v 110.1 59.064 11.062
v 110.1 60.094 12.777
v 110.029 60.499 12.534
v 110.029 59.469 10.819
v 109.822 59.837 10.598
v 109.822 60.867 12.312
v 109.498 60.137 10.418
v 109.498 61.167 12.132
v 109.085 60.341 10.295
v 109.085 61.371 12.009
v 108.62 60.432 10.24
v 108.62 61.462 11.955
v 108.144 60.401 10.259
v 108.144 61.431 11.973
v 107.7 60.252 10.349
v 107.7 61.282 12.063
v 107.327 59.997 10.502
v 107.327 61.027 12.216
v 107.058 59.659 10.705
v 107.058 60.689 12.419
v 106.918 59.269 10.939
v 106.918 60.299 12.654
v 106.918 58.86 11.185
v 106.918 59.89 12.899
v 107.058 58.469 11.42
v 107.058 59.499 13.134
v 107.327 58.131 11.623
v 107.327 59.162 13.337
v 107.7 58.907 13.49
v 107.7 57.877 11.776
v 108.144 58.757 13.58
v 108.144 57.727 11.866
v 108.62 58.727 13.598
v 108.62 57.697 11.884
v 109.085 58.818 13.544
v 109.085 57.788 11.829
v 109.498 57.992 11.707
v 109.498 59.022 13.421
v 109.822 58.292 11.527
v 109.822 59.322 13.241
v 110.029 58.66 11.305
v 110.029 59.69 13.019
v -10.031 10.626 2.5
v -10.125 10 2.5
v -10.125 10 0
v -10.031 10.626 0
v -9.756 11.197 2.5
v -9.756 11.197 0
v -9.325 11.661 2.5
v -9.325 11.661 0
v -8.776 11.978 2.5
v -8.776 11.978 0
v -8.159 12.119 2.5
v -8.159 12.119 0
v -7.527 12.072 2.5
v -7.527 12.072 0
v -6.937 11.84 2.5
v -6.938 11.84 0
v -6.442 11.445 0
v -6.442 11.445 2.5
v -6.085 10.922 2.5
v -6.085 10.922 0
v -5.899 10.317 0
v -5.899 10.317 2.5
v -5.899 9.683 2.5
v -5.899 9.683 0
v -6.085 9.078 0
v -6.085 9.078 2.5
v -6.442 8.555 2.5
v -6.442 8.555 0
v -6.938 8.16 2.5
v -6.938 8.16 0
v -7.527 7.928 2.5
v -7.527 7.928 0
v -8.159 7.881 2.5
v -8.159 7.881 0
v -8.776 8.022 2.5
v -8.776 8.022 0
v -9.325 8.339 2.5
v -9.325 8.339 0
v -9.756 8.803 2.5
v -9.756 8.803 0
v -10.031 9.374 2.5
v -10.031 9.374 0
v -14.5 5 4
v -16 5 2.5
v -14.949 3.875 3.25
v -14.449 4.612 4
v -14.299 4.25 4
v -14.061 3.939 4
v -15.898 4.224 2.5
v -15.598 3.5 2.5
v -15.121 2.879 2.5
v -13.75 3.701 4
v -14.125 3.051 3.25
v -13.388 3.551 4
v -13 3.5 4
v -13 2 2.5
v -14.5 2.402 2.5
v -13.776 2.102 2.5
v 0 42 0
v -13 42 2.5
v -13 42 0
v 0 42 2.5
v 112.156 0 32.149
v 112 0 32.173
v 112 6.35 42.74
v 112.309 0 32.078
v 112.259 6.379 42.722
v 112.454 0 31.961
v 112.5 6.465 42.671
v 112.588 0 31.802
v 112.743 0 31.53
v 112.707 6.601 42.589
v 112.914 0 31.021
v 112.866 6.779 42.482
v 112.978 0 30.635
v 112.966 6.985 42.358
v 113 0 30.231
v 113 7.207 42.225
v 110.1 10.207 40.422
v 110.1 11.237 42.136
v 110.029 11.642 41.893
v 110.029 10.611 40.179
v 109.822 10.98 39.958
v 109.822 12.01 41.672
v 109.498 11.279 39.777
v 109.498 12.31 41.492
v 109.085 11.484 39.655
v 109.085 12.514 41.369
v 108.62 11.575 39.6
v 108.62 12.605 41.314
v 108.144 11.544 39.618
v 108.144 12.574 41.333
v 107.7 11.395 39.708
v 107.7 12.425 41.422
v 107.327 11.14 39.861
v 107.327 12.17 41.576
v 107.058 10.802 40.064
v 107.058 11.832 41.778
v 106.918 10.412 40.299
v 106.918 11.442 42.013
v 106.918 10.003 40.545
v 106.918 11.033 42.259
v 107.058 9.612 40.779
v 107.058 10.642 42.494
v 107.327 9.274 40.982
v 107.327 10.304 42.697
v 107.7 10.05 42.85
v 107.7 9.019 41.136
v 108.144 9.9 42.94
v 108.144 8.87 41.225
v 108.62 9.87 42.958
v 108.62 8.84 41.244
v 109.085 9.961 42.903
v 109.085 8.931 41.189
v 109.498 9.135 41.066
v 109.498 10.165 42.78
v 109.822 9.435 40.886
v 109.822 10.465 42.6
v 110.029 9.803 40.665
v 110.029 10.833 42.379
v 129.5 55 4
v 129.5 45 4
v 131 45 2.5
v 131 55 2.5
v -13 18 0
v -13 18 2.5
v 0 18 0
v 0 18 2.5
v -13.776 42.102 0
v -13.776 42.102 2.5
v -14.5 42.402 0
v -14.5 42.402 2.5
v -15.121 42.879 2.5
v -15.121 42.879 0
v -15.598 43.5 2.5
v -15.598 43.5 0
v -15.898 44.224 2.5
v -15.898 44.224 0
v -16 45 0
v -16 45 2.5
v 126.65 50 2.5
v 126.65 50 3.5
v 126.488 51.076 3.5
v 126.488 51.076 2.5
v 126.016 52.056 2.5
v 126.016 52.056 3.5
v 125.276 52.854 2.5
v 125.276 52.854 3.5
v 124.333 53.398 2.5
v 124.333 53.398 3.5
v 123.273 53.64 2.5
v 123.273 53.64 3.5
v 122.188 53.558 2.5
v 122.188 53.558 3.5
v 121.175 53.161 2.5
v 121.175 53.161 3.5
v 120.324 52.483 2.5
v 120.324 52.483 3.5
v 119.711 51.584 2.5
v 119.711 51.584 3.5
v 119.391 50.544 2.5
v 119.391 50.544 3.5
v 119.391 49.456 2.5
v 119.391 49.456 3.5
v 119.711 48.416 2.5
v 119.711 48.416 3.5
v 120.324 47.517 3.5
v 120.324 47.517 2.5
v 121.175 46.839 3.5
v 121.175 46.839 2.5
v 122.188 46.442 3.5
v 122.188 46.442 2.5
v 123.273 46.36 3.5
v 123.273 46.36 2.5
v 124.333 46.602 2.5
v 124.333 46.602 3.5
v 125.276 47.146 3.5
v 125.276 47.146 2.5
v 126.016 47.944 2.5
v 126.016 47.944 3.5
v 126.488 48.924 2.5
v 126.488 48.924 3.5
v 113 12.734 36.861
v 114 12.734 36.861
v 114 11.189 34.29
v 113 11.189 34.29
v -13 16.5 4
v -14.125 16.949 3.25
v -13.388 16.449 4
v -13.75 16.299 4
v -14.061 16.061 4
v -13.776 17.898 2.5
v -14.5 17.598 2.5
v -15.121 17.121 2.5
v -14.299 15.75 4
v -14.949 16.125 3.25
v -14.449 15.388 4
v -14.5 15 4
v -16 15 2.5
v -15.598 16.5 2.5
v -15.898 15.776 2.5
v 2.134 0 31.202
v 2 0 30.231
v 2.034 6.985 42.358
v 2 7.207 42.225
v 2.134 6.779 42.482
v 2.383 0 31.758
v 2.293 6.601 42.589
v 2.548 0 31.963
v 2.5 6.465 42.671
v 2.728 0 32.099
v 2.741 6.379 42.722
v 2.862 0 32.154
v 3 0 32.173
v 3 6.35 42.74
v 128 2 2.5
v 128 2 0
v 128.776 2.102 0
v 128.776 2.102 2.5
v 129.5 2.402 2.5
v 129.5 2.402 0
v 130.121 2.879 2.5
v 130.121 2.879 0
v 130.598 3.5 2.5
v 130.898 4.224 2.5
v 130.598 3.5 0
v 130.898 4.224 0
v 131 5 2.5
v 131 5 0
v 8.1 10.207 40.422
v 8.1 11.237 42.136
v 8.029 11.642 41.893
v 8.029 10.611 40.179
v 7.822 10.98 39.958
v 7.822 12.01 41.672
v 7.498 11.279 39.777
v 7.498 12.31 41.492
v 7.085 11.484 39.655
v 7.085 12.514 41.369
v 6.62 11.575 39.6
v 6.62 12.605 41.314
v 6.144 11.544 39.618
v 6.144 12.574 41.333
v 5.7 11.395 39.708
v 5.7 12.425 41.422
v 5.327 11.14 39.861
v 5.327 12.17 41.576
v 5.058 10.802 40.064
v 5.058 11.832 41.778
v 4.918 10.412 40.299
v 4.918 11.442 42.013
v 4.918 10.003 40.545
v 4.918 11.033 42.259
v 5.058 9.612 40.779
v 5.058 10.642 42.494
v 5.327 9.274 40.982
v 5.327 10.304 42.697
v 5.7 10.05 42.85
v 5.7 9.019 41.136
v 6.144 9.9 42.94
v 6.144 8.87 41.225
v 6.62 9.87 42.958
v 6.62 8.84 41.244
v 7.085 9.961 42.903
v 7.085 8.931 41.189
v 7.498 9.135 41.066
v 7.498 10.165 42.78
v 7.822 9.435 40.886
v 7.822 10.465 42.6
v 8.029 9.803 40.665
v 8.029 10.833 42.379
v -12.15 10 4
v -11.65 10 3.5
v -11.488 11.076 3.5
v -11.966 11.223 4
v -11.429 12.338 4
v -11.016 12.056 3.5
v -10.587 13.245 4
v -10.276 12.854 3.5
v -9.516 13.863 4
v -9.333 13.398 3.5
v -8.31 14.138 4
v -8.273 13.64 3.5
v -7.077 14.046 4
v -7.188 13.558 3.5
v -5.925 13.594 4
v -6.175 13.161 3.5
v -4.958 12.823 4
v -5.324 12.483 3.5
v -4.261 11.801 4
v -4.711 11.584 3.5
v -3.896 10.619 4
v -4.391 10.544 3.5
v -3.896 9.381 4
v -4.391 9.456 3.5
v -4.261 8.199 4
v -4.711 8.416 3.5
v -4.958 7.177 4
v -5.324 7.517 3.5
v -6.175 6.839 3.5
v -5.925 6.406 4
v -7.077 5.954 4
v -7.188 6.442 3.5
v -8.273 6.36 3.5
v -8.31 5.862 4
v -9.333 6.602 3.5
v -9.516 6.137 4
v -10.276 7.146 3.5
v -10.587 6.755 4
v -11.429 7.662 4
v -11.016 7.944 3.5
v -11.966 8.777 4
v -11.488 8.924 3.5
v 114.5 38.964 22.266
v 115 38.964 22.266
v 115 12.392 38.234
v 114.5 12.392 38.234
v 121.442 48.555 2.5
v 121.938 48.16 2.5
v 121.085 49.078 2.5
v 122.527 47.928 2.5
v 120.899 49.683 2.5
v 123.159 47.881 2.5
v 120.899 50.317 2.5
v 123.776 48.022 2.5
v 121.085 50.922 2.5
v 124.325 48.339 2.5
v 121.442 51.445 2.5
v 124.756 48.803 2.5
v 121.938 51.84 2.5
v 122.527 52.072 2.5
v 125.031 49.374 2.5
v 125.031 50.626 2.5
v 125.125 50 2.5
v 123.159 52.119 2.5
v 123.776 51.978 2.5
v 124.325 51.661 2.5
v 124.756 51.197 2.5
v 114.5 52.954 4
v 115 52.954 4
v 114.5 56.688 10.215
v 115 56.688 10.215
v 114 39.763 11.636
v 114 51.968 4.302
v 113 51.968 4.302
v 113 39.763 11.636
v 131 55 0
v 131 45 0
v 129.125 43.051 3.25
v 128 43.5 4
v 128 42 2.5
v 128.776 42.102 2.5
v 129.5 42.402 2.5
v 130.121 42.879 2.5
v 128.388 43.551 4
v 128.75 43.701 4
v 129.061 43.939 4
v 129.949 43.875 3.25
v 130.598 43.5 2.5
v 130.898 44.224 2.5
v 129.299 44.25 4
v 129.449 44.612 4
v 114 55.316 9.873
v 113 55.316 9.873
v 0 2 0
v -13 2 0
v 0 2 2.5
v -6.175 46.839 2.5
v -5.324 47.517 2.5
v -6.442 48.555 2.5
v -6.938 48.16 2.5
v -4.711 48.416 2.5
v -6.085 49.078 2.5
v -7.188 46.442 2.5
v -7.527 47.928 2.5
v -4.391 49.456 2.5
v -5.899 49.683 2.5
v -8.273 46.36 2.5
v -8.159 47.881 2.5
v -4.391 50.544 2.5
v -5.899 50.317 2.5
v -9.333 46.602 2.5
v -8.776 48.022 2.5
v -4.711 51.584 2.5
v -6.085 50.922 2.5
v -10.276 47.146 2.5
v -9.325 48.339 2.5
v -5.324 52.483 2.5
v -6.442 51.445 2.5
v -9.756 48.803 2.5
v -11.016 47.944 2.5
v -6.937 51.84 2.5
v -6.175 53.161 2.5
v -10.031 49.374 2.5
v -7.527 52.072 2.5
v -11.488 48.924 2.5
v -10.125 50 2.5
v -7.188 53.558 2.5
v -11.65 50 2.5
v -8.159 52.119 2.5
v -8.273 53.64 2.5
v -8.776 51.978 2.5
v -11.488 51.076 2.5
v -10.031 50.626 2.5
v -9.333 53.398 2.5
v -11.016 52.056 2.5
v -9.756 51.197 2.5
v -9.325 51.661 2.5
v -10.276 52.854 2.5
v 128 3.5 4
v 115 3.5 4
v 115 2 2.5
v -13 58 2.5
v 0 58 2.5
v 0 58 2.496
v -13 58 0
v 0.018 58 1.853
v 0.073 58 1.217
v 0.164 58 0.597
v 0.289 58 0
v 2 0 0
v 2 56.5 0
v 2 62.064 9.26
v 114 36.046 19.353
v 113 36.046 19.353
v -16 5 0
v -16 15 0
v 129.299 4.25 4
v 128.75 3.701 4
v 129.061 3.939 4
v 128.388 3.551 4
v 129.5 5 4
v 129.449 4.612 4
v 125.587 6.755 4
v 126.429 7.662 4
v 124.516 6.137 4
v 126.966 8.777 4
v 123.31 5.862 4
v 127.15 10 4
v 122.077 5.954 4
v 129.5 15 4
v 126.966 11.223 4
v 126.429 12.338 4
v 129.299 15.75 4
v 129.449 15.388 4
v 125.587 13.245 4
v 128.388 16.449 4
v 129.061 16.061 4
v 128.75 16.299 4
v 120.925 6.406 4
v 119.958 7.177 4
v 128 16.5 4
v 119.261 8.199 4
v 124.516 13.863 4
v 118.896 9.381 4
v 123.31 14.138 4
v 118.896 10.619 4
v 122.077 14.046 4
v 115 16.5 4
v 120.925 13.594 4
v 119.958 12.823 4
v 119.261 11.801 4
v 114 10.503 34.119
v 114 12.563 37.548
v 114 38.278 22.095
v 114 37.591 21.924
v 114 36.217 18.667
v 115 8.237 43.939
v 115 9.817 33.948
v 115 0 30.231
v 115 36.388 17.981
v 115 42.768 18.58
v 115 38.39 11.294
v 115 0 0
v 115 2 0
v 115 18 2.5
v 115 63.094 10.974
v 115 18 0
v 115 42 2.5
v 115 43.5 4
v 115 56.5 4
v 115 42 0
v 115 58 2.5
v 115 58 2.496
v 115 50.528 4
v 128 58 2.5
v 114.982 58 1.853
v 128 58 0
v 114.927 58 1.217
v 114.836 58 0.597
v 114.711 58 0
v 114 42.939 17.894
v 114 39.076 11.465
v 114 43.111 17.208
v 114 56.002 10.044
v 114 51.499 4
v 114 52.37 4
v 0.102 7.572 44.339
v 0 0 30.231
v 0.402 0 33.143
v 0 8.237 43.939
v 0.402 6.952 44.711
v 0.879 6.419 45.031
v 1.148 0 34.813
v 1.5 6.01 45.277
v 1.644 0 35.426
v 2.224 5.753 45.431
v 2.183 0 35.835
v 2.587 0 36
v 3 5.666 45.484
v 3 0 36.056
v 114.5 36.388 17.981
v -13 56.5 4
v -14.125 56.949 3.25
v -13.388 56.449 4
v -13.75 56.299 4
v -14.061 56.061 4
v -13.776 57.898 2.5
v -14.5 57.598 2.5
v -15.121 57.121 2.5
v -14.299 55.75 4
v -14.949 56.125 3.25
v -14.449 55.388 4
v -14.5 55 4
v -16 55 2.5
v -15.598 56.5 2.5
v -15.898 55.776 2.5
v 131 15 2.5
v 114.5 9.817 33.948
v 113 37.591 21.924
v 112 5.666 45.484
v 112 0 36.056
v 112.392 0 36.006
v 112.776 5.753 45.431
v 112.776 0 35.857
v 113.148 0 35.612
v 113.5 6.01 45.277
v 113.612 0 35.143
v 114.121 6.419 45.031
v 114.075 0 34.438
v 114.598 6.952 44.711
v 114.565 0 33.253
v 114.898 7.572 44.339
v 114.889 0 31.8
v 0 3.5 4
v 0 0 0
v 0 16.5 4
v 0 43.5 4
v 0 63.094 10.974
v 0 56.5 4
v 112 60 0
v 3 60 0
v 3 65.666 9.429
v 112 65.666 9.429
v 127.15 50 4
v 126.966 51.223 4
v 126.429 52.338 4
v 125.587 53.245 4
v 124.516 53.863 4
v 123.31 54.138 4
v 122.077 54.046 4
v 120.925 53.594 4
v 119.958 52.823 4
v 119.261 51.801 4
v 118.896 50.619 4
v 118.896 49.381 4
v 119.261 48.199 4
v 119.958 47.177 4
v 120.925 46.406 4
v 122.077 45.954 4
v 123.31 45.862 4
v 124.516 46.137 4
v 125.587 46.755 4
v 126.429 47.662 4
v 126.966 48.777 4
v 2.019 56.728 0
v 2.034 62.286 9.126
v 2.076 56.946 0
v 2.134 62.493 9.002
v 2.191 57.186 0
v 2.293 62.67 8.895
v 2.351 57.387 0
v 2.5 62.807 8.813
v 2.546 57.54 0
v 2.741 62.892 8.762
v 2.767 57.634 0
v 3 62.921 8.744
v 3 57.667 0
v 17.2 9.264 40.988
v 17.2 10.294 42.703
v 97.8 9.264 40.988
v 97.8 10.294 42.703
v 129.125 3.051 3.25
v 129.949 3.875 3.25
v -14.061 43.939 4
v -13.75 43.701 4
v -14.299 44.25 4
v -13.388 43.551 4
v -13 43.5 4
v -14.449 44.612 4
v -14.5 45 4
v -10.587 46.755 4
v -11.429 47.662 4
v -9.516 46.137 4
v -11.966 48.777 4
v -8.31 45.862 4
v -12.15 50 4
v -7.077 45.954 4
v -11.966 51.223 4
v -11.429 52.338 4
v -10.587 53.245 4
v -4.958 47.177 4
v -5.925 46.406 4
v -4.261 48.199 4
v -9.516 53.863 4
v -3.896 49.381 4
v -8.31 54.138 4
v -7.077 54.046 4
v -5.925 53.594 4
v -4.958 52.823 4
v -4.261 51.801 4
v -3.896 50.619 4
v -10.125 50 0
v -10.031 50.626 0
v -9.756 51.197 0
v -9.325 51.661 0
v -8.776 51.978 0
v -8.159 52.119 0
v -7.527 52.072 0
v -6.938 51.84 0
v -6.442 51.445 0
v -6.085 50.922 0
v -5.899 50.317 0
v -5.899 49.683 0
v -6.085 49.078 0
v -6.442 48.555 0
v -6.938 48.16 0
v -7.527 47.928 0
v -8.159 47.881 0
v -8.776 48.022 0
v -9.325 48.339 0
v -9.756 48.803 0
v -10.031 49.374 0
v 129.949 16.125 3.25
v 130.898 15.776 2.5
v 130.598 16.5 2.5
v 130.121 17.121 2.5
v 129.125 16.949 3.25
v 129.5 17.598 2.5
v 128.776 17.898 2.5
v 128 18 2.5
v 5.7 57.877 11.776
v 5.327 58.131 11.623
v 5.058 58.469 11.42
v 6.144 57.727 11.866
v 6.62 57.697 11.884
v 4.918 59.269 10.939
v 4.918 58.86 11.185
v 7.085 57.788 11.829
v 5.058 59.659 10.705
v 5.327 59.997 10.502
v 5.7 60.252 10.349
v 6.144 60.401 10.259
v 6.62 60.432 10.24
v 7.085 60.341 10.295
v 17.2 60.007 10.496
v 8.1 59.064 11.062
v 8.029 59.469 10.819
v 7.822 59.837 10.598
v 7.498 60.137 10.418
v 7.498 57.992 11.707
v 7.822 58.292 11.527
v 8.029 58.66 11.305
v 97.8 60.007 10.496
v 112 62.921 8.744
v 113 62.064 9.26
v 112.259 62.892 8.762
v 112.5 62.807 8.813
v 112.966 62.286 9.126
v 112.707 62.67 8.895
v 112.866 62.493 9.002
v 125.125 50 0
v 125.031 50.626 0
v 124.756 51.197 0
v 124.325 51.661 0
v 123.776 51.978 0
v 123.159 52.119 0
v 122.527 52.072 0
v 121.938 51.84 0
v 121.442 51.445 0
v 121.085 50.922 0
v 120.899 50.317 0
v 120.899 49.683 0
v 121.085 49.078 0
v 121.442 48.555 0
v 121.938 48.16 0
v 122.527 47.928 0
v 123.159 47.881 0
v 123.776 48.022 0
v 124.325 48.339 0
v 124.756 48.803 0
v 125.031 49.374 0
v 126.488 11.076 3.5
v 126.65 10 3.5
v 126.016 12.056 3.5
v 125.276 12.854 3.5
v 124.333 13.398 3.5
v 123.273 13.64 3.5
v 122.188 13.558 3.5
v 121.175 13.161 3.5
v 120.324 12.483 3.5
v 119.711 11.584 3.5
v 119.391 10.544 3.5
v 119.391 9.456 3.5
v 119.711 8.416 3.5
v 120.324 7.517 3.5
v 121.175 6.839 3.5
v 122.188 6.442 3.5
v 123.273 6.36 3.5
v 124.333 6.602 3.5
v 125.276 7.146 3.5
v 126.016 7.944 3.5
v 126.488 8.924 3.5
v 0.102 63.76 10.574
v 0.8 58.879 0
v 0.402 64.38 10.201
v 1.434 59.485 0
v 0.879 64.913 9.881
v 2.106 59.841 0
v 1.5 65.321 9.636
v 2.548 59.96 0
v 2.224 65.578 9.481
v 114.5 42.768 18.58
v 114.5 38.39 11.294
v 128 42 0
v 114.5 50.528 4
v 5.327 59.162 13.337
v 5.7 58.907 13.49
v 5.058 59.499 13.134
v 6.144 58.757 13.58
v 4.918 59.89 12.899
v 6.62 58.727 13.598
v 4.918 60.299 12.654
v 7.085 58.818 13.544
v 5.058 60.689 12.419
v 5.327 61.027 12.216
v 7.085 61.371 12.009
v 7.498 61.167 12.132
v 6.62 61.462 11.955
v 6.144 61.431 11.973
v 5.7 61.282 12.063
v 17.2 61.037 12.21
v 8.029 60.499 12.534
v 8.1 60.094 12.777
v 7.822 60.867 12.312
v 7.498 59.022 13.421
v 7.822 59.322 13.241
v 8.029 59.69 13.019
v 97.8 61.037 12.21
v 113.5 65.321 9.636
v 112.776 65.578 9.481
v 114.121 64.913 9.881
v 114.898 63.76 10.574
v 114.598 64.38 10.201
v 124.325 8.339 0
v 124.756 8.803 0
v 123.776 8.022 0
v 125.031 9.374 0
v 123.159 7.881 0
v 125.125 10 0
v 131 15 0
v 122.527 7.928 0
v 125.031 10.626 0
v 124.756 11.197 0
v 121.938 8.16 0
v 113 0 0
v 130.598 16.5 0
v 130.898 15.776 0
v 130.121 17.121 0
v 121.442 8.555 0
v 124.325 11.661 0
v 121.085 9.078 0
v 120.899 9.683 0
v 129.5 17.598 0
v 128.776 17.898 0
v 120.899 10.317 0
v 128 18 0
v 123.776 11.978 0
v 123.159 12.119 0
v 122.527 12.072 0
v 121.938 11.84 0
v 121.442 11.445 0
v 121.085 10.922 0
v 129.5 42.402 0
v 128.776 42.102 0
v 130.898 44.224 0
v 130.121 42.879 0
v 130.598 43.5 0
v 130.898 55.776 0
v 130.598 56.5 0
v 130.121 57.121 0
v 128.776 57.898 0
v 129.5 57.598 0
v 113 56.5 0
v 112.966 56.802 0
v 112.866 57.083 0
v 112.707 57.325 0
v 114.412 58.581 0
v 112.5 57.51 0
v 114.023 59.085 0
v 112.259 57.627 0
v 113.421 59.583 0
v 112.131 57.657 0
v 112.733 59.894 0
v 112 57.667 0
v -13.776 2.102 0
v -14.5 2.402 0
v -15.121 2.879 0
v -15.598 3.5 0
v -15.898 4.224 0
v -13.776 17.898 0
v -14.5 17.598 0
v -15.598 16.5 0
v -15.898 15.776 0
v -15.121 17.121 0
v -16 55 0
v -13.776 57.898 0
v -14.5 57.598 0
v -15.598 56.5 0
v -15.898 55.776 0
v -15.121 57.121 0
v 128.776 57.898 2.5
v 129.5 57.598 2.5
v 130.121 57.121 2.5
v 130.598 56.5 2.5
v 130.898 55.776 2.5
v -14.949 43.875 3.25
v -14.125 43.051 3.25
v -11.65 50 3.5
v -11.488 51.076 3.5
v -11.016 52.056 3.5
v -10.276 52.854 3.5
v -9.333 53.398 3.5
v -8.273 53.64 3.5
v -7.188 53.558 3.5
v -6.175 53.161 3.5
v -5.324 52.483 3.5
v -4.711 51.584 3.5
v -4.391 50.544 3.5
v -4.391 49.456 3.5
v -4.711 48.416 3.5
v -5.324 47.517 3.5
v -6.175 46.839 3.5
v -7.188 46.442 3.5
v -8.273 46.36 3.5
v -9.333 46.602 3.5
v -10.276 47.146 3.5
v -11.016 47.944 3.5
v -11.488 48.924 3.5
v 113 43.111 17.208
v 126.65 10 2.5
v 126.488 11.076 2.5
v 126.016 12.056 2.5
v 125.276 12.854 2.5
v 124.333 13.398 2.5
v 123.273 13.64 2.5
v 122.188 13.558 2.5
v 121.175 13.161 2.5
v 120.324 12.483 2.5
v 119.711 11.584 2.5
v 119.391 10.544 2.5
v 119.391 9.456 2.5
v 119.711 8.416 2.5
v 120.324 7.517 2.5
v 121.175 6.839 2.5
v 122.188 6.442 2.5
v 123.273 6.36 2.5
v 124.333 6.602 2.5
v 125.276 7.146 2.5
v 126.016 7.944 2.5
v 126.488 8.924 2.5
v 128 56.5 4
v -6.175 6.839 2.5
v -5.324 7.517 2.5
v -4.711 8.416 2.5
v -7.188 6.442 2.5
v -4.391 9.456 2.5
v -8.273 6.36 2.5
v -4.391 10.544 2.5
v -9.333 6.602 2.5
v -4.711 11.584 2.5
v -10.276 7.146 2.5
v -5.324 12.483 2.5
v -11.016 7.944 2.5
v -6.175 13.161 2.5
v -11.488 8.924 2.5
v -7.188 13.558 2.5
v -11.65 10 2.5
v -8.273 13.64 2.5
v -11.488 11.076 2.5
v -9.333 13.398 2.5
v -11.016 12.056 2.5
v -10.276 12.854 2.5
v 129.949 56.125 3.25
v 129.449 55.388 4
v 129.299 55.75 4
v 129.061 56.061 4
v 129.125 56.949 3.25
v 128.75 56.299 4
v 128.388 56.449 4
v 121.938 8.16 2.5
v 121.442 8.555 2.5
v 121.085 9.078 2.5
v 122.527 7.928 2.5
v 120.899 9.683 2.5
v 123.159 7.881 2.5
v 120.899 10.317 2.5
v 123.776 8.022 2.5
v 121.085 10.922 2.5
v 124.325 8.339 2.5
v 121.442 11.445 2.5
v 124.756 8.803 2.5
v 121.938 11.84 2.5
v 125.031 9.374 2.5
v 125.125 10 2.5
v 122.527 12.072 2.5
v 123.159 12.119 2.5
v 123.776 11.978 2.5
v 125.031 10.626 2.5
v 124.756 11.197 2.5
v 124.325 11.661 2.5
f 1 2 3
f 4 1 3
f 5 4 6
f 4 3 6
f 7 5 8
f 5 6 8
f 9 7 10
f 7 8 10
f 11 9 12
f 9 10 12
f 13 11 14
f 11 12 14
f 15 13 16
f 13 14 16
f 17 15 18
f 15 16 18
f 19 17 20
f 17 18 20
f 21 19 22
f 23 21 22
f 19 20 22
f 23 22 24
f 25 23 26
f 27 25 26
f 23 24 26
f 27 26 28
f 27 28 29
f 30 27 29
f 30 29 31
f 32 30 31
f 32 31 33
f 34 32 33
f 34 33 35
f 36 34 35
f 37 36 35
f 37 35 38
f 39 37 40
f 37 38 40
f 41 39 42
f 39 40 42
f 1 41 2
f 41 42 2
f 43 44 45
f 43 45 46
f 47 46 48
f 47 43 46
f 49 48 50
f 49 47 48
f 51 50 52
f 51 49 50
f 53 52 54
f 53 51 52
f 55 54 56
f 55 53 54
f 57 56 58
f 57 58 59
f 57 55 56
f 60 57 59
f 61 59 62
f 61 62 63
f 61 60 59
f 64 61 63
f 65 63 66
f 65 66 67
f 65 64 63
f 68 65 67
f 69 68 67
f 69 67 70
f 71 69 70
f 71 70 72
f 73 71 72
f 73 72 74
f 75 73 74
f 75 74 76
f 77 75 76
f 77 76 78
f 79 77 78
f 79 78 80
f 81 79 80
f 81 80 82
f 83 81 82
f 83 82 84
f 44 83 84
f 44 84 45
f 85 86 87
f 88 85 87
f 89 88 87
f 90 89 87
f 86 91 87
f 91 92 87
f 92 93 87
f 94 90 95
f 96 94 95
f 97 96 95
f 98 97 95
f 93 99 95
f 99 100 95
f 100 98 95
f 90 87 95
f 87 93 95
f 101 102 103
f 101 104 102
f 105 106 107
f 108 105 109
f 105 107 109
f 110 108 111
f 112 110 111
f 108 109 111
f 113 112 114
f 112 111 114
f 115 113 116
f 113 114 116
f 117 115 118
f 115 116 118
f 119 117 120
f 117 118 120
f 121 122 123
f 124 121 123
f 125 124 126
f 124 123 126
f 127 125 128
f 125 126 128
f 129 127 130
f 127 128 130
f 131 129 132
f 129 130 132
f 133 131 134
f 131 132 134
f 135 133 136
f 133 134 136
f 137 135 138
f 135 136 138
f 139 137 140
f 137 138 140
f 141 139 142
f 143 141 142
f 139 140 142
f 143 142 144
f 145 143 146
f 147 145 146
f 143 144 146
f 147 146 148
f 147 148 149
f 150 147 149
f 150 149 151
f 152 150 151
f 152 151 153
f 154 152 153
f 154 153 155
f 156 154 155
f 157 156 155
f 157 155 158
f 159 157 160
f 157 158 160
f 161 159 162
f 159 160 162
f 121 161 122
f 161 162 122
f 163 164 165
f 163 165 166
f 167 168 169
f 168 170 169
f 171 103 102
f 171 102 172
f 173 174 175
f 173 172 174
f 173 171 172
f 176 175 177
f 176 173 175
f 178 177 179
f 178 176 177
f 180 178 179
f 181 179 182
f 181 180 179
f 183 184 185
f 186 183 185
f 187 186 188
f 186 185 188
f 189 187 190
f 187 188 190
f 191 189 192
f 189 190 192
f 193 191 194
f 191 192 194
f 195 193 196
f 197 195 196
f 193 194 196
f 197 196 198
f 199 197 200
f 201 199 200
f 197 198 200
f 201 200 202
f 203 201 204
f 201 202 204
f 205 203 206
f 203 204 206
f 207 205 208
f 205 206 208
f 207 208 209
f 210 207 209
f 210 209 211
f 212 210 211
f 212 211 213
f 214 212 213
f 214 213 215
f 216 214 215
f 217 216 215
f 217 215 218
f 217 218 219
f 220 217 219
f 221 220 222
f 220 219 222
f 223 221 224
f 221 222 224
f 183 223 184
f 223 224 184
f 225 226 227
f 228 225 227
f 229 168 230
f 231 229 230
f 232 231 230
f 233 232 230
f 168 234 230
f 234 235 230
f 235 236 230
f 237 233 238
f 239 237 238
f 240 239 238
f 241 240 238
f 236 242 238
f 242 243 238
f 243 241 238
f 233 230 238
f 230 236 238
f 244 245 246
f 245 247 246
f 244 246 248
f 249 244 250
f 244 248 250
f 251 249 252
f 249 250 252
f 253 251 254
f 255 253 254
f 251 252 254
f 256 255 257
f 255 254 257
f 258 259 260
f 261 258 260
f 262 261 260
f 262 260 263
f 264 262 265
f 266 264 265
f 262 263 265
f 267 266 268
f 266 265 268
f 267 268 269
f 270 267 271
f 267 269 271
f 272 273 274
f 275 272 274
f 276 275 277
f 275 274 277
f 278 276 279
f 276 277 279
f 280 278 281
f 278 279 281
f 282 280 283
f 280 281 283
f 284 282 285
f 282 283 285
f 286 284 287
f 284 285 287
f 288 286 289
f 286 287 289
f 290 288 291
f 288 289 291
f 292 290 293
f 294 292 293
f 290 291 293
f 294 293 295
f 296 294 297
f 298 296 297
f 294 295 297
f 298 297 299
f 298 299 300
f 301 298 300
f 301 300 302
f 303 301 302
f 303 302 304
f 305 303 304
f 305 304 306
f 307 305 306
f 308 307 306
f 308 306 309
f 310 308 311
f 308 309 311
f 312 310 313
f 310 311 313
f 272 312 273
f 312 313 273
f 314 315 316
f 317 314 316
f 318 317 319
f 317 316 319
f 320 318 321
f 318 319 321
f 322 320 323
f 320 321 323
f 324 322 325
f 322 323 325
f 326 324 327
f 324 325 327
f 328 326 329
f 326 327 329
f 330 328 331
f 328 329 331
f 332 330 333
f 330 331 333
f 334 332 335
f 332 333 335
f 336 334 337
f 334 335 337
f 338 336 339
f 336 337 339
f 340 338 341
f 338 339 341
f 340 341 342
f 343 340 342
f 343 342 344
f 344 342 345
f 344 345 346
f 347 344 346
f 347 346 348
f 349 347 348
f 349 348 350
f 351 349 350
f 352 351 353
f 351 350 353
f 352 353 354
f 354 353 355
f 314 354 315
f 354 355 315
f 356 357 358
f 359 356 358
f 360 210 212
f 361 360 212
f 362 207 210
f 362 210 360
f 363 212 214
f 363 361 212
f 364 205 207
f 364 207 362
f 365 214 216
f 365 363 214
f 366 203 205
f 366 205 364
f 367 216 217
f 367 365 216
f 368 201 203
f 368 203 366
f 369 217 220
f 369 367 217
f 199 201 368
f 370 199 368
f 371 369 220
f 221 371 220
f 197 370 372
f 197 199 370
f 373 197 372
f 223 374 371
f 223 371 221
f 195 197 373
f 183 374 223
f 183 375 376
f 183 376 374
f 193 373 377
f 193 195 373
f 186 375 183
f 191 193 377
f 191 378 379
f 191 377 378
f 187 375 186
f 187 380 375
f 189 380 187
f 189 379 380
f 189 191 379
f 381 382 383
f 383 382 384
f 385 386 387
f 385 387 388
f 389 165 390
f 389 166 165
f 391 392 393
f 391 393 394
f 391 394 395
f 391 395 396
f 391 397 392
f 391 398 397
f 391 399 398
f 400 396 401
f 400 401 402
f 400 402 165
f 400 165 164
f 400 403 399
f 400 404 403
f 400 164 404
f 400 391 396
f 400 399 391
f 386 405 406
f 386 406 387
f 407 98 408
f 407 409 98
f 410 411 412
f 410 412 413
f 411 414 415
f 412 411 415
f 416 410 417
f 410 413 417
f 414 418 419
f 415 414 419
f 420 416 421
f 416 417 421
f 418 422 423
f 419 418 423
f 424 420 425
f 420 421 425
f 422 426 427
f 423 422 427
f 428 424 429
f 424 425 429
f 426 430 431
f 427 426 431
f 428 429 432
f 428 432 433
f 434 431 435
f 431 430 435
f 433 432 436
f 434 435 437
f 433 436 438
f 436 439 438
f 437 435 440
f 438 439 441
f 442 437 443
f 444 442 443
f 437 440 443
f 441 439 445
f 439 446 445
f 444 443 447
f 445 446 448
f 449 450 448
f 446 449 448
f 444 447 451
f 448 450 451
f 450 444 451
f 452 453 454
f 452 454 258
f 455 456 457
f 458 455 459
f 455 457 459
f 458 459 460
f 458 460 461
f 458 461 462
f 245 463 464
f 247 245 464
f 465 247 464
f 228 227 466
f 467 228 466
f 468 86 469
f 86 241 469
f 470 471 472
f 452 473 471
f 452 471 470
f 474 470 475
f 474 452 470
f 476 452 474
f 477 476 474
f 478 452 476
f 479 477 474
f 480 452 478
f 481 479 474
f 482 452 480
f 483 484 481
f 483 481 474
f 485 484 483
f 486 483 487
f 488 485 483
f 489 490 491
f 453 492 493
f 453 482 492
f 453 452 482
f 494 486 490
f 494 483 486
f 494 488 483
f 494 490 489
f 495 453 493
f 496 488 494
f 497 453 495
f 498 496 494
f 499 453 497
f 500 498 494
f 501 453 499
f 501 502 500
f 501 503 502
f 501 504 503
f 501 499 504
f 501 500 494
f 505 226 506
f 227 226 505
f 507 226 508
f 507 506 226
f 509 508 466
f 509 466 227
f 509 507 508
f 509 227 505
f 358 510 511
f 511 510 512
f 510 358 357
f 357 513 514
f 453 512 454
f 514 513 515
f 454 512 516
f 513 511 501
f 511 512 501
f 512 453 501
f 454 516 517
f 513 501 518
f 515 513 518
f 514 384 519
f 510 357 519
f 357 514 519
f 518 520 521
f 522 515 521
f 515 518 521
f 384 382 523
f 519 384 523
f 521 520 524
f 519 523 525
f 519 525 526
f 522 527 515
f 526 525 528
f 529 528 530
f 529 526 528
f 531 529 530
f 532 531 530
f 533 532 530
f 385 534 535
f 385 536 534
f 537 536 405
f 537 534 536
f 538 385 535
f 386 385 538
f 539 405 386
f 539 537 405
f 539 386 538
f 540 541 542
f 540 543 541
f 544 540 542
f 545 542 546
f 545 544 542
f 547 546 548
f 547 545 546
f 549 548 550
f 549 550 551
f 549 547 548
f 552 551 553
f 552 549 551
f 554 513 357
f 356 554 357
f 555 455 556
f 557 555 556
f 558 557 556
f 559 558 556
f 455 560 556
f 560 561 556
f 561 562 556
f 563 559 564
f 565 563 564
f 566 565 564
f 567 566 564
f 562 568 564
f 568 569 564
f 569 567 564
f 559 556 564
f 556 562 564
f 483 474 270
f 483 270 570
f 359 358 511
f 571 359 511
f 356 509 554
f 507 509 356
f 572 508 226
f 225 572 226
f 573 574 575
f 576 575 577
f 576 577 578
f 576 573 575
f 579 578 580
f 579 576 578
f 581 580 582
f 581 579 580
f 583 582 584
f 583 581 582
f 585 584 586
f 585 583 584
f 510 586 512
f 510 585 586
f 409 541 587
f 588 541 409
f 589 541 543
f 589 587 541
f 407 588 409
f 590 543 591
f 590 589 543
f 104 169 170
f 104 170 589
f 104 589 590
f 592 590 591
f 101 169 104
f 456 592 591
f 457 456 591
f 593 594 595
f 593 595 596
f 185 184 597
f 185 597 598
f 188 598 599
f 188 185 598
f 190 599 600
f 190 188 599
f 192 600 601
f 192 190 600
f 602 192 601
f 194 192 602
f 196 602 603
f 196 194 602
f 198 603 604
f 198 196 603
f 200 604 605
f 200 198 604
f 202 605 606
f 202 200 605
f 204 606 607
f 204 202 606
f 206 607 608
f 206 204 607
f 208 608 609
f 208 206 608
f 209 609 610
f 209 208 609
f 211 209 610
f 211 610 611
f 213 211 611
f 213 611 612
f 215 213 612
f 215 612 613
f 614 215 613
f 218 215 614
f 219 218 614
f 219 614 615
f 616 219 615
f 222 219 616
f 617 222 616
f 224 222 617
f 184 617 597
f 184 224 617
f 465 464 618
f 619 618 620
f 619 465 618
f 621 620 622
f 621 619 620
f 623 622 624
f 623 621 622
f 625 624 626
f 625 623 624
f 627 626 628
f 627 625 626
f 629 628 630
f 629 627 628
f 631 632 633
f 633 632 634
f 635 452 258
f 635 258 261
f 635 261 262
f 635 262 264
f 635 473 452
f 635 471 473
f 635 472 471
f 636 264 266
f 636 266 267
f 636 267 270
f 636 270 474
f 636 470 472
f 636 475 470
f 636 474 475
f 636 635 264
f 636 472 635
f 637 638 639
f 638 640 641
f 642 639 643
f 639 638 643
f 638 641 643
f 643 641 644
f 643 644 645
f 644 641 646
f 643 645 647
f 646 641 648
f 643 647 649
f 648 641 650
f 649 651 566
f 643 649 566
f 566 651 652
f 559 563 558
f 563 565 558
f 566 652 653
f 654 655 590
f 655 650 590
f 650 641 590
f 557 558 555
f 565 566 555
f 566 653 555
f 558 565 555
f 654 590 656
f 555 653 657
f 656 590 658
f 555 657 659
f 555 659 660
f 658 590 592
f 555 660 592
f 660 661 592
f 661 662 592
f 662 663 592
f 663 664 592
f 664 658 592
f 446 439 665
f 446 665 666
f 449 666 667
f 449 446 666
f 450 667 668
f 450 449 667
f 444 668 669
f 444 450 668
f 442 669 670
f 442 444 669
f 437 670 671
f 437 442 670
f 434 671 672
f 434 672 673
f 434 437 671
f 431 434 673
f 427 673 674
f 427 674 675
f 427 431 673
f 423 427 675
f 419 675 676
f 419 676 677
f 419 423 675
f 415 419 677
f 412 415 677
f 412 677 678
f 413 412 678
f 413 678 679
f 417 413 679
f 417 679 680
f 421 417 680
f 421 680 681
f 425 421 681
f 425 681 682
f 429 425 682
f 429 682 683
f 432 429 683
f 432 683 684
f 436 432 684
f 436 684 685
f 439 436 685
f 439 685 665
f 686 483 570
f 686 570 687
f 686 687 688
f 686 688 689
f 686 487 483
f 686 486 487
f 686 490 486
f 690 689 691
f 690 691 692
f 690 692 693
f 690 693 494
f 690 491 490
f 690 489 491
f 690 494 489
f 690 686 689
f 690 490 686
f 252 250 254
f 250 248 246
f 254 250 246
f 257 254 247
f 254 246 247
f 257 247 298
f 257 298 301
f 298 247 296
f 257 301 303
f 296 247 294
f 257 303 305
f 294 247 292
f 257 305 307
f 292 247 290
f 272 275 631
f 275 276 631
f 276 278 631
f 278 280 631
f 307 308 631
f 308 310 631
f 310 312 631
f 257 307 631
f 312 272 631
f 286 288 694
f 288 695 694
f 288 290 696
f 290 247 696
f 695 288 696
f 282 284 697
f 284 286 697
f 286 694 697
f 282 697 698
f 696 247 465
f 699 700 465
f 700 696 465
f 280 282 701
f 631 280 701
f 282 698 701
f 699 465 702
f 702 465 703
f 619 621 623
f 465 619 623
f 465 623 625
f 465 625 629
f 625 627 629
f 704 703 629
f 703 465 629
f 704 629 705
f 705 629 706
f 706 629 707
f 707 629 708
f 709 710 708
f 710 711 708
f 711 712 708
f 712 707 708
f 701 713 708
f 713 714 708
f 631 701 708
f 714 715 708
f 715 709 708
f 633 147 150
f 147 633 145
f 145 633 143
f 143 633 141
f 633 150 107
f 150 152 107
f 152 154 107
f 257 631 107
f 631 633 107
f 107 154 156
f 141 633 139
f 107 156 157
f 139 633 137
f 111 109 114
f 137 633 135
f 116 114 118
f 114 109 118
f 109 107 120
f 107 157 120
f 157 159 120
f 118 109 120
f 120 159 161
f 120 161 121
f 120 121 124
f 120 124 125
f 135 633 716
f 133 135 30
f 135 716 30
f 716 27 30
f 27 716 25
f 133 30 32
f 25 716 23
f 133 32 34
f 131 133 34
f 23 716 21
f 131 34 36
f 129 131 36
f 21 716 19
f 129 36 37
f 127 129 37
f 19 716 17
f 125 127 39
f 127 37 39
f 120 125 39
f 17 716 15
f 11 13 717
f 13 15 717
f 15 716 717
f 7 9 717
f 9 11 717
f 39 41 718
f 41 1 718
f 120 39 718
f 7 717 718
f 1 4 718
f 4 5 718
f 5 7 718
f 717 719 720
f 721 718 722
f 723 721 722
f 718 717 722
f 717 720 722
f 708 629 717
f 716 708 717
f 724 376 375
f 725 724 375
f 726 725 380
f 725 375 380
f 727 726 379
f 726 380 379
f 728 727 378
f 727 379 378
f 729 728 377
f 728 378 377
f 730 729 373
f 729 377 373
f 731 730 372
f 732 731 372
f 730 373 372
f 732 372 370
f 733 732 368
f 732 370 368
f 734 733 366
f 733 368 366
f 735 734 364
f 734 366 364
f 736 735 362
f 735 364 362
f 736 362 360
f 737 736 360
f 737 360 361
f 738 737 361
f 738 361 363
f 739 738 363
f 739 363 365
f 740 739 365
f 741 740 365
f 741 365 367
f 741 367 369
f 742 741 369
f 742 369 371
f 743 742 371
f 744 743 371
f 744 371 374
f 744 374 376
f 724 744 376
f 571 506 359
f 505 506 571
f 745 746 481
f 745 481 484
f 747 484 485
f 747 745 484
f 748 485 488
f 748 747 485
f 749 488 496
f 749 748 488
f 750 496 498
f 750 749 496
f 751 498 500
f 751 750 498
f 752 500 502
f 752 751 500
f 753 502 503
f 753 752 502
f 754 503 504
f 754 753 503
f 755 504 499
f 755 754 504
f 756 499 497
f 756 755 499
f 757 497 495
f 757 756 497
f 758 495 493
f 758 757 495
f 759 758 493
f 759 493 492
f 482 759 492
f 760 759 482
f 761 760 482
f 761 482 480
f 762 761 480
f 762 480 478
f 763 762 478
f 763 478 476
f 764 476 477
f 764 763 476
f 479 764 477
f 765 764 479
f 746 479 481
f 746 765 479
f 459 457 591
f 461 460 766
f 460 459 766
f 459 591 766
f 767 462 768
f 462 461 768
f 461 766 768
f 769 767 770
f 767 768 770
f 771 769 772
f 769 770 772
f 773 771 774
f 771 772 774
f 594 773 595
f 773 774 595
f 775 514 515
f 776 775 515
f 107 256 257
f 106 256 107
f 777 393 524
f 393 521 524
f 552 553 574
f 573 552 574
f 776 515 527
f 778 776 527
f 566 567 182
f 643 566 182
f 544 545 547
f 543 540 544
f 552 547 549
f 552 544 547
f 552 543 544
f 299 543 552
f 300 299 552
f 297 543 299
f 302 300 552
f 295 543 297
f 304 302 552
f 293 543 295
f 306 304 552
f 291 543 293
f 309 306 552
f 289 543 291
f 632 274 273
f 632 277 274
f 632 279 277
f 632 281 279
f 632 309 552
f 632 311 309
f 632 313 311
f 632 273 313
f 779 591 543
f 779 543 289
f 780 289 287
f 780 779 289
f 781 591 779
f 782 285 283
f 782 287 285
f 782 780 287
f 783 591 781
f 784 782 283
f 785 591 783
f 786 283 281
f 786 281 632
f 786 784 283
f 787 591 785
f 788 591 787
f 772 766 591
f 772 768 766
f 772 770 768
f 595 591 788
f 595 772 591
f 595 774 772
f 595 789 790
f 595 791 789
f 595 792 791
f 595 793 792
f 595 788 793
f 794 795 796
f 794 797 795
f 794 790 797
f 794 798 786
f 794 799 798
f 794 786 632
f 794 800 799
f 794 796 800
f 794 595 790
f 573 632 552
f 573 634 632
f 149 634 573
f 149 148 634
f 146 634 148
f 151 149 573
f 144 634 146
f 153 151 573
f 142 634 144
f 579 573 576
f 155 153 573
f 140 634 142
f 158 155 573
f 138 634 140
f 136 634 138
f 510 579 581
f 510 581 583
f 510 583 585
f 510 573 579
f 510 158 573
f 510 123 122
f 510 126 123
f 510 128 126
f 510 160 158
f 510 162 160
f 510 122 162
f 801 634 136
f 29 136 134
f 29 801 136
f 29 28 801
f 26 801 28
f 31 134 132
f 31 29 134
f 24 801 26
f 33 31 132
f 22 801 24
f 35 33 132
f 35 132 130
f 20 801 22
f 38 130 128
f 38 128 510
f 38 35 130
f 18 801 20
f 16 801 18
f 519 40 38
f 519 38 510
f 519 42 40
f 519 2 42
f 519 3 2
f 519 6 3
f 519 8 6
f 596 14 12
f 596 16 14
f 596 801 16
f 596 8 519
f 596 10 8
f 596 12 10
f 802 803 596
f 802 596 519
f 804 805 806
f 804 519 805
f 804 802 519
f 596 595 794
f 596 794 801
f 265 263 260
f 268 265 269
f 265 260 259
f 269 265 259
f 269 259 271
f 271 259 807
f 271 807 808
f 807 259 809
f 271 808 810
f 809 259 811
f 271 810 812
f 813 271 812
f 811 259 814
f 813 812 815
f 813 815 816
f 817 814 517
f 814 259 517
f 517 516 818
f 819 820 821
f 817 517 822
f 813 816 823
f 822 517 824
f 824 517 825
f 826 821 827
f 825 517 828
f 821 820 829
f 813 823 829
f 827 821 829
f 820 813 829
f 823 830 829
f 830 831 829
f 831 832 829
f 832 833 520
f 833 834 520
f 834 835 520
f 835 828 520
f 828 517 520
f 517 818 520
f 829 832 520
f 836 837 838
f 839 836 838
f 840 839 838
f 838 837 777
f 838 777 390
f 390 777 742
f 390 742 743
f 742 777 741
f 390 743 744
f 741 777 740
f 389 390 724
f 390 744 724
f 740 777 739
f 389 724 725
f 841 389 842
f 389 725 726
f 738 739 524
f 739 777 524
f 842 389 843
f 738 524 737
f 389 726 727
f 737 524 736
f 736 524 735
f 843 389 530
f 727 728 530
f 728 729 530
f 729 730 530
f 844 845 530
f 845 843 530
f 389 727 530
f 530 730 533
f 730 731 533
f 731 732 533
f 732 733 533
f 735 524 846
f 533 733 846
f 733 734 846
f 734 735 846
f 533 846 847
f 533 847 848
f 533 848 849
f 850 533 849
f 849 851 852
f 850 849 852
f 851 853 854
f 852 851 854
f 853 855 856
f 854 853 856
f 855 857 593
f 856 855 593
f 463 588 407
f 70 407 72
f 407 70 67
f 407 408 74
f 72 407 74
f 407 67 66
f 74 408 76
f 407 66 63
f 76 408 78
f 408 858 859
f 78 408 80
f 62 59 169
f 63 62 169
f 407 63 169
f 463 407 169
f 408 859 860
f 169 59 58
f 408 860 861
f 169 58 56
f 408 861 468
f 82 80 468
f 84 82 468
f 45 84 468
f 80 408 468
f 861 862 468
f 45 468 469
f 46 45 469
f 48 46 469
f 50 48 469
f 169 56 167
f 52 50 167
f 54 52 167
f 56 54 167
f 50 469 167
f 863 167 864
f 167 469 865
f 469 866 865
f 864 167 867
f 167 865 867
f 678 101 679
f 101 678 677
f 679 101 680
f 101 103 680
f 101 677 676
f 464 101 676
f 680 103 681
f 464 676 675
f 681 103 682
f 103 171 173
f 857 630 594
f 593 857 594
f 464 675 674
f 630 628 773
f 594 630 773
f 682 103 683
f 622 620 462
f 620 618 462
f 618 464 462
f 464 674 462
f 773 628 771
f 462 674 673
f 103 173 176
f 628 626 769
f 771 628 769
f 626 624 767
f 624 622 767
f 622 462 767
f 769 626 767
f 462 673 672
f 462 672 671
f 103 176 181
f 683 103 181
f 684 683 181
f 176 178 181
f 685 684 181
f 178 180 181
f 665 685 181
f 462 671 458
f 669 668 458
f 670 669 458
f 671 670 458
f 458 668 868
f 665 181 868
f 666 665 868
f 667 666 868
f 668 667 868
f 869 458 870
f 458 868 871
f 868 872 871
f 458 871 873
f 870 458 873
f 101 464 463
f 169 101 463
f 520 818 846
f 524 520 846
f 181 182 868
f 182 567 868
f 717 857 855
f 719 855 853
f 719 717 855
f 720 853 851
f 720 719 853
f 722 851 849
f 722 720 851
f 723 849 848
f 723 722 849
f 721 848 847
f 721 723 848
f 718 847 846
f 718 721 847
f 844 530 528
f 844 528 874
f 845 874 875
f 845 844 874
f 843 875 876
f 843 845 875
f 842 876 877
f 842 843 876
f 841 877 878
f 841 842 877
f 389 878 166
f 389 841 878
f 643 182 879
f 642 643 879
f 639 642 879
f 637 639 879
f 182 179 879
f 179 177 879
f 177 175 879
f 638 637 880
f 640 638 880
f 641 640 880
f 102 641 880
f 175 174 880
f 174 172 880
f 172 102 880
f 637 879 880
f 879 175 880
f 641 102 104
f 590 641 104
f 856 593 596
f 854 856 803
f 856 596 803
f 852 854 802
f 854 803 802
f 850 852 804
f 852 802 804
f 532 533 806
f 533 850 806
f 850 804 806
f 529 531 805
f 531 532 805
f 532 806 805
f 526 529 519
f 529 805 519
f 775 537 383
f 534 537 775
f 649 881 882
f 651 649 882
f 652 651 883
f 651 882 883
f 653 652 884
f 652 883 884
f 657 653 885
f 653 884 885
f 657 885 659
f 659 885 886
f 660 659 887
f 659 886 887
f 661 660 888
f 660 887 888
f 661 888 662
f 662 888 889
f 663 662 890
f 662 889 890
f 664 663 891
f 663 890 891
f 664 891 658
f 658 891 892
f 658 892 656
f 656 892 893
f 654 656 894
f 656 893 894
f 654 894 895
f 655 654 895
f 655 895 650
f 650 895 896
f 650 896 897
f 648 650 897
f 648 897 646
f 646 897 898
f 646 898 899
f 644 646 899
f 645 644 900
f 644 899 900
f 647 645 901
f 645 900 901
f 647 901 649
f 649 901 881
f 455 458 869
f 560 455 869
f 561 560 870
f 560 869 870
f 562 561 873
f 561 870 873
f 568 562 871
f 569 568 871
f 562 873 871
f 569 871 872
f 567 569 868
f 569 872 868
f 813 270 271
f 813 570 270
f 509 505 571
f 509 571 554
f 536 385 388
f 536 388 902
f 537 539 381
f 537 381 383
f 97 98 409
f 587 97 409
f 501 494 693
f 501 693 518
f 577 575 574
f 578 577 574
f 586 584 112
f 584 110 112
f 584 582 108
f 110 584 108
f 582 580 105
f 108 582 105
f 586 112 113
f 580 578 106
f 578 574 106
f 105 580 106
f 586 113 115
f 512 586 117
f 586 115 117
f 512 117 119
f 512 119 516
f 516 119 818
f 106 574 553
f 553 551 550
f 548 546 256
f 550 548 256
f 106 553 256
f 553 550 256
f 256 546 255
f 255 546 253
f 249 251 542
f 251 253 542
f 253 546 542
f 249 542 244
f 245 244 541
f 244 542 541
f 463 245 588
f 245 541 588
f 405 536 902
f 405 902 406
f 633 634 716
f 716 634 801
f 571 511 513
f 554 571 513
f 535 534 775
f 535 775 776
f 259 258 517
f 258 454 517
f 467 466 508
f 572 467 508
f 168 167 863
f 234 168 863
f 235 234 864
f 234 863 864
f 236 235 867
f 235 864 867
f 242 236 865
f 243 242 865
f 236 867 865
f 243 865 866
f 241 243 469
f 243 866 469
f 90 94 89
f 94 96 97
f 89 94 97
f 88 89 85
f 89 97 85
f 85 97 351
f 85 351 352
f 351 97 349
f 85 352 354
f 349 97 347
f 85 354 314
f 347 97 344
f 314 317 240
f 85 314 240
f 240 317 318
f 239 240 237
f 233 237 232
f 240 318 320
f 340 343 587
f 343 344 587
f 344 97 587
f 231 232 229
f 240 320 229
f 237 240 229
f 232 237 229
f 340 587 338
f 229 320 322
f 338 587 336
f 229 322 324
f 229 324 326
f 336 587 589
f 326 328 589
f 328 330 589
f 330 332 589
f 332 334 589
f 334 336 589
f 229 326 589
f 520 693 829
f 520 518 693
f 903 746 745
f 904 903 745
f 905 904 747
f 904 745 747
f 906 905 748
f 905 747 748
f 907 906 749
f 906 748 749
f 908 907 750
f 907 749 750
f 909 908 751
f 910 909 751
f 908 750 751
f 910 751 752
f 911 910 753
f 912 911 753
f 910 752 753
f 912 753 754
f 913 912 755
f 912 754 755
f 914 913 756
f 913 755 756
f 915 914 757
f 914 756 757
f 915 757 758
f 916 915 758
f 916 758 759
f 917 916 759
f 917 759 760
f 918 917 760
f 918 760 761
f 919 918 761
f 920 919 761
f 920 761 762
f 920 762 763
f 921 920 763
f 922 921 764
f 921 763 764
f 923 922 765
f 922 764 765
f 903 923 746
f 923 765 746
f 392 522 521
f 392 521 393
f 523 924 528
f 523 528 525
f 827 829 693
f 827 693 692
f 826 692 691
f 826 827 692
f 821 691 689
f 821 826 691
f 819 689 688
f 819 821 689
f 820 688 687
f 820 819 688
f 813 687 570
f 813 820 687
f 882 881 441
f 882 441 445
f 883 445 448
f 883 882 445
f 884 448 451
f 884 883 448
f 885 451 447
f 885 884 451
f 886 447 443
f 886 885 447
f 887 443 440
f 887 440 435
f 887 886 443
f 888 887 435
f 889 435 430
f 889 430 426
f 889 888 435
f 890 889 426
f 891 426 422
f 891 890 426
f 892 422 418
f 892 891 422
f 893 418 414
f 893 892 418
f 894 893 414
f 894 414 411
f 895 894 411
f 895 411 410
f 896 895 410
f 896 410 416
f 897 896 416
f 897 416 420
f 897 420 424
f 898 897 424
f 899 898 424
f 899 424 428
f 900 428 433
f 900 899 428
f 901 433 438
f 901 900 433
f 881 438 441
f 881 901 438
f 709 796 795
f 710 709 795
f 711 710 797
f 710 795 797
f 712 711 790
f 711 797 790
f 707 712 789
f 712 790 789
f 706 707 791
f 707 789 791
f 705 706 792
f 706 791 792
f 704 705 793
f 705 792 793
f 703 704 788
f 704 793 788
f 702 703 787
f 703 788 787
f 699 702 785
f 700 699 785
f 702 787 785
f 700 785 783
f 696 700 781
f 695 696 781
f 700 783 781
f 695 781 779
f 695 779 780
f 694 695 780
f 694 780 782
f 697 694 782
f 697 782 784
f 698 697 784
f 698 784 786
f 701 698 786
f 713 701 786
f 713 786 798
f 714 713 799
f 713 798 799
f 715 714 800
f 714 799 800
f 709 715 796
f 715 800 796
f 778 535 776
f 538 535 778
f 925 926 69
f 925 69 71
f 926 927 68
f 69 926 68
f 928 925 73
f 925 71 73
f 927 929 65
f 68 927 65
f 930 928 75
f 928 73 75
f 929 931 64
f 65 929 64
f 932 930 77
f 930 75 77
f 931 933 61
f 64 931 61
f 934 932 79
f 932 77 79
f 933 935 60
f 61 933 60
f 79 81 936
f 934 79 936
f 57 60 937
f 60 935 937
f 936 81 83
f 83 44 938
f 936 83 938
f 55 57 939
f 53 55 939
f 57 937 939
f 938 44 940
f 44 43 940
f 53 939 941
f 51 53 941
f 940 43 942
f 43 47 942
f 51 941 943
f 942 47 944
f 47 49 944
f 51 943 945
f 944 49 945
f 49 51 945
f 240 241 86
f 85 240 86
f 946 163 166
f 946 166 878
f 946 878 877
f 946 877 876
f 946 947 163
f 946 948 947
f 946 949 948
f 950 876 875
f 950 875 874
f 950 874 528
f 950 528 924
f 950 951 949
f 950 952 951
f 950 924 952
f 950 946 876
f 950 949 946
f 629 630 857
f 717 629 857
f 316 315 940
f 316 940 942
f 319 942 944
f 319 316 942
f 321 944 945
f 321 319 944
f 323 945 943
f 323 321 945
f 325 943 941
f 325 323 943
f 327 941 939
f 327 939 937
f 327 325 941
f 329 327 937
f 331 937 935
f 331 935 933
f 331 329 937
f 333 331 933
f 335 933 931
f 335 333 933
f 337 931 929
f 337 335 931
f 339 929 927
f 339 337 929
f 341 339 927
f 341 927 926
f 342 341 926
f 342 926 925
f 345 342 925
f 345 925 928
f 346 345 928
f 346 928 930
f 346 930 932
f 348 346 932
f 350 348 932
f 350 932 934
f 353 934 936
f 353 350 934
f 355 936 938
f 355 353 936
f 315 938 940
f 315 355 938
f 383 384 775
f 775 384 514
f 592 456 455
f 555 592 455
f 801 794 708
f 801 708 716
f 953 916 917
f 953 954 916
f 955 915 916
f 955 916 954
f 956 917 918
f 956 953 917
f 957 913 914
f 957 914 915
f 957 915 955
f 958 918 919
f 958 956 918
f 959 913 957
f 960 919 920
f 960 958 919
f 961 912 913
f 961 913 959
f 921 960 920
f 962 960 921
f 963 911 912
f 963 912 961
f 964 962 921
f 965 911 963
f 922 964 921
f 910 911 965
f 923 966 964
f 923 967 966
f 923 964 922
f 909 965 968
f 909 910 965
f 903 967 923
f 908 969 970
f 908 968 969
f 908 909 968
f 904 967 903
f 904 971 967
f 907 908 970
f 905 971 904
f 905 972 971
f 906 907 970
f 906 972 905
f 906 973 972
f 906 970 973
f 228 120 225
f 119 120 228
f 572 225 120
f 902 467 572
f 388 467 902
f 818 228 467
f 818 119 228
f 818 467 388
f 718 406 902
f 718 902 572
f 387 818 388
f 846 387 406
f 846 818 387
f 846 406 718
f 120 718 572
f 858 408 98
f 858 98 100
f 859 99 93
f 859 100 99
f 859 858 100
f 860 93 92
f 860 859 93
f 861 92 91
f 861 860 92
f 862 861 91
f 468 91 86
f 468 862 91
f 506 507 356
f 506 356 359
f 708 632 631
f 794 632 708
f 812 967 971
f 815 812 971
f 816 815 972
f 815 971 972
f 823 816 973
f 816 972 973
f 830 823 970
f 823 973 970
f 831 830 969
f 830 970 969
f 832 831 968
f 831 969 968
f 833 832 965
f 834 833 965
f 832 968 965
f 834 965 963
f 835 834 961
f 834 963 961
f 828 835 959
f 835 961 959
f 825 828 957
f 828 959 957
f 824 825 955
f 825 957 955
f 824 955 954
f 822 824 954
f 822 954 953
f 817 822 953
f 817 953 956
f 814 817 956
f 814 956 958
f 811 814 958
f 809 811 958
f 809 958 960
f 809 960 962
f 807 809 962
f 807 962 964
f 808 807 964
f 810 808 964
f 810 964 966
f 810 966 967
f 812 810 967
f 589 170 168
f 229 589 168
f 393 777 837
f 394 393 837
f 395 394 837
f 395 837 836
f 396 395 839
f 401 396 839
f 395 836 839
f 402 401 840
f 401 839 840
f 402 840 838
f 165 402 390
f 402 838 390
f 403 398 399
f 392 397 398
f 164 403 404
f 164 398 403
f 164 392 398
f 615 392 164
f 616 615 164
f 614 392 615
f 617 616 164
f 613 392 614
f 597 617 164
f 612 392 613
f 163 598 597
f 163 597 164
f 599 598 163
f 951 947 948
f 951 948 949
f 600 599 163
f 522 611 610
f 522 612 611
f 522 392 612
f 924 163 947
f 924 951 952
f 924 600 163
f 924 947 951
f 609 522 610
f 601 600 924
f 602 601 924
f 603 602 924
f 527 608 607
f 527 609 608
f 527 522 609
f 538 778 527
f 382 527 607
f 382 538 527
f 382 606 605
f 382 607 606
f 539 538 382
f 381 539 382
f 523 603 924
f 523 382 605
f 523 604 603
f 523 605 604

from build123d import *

# Parameters (mm, degrees)
BOSS_EXTRUDE1_DEPTH      = 115
SKETCH2_W                = 115
SKETCH2_H                = 70
BOSS_EXTRUDE2_DEPTH      = 11
FILLET1_R                = 3
SHELL1_T                 = -2
SKETCH3_R                = 1.6
CUT_EXTRUDE1_DEPTH       = 2
SKETCH4_W                = 80.6
SKETCH4_H                = 59.2
CUT_EXTRUDE2_DEPTH       = 2
CUT_EXTRUDE3_DEPTH       = 2
CUT_EXTRUDE4_DEPTH       = 1
CHAMFER3_SIZE            = 0.5
BOSS_EXTRUDE3_START      = -2
SKETCH7_W                = 4
SKETCH7_H                = 16
BOSS_EXTRUDE3_DEPTH      = 18
SKETCH8_R                = 2.125
CUT_EXTRUDE5_DEPTH       = 4
SKETCH9_R                = 3.65
CUT_EXTRUDE6_DEPTH       = 1.5
CHAMFER4_SIZE            = 0.5
FILLET2_R                = 3
CHAMFER4_OF_MIRROR1_SIZE = 0.5
FILLET2_OF_MIRROR1_R     = 3
CHAMFER5_SIZE            = 1.5


with BuildPart() as part:
    # Sketch1 → Boss-Extrude1 (new body)
    with BuildSketch(Plane(origin=(0, 0, 0), x_dir=(0, 0, -1), z_dir=(1, 0, 0))):
        Polygon((0, 0), (0, 60), (-36.055512755, 0), align=None)
    extrude(amount=BOSS_EXTRUDE1_DEPTH)

    # Sketch2 → Boss-Extrude2 (add)
    with BuildSketch(Plane(origin=(0, 15.918367347, 26.489764473), x_dir=(1, 0, 0), z_dir=(0, 0.515078754, 0.857142857))):
        with Locations((57.5, 16.428571429)):
            Rectangle(SKETCH2_W, SKETCH2_H)
    extrude(amount=BOSS_EXTRUDE2_DEPTH)

    # Fillet1
    fillet1_edges = [part.edges().sort_by_distance(p)[0] for p in [
        (0, 62.832933145, 4.714285714),
        (0, 2.832933145, 40.769798469),
        (115, 2.832933145, 40.769798469),
        (115, 62.832933145, 4.714285714),
    ]]
    fillet(fillet1_edges, radius=FILLET1_R)

    # Shell1
    shell1_openings = [part.faces().sort_by_distance(p)[0] for p in [
        (57.5, 39.074957911, 0),
        (57.5, 0, 22.497645419),
    ]]
    offset(amount=SHELL1_T, openings=shell1_openings, kind=Kind.INTERSECTION)

    # Sketch3 → Cut-Extrude1 (cut)
    with BuildSketch(Plane(origin=(0, 21.584233637, 35.918335901), x_dir=(1, 0, 0), z_dir=(0, 0.515078754, 0.857142857))):
        with Locations((6.5, 44.928571429)):
            Circle(SKETCH3_R)
        with Locations((6.5, -12.071428571)):
            Circle(SKETCH3_R)
        with Locations((108.5, -12.071428571)):
            Circle(SKETCH3_R)
        with Locations((108.5, 44.928571429)):
            Circle(SKETCH3_R)
    extrude(amount=-CUT_EXTRUDE1_DEPTH, mode=Mode.SUBTRACT)

    # Sketch4 → Cut-Extrude2 (cut)
    with BuildSketch(Plane(origin=(0, 21.584233637, 35.918335901), x_dir=(1, 0, 0), z_dir=(0, 0.515078754, 0.857142857))):
        with Locations((57.5, 16.428571429)):
            Rectangle(SKETCH4_W, SKETCH4_H)
    extrude(amount=-CUT_EXTRUDE2_DEPTH, mode=Mode.SUBTRACT)

    # Sketch5 → Cut-Extrude3 (cut)
    with BuildSketch(Plane(origin=(115, 0, 0), x_dir=(0, 0, -1), z_dir=(1, 0, 0))):
        Polygon((-36.861471556, 12.734320964), (-34.290042984, 11.189084703), (-19.352759129, 36.04622756), (-21.9241877, 37.591463821), align=None)
        Polygon((-17.207652396, 43.110512174), (-9.872930944, 55.31622646), (-4.301502372, 51.968214561), (-11.636223824, 39.762500275), align=None)
    extrude(amount=-CUT_EXTRUDE3_DEPTH, mode=Mode.SUBTRACT)

    # Sketch6 → Cut-Extrude4 (cut)
    with BuildSketch(Plane(origin=(115, 0, 0), x_dir=(0, 0, -1), z_dir=(1, 0, 0))):
        Polygon((-38.233693167, 12.39225686), (-33.947978881, 9.816863092), (-17.980537518, 36.388291664), (-22.266251804, 38.963685432), align=None)
        Polygon((-11.294159721, 38.390278664), (-2.929280762, 52.310278664), (-10.214995047, 56.68844807), (-18.579874006, 42.76844807), align=None)
    extrude(amount=-CUT_EXTRUDE4_DEPTH, mode=Mode.SUBTRACT)

    # Chamfer3
    chamfer3_edges = [part.edges().sort_by_distance(p)[0] for p in [
        (114, 40.579363367, 14.937016864),
        (114, 49.72844807, 14.397434527),
        (114, 54.499363367, 6.572137904),
        (114, 45.350278664, 7.111720241),
        (114, 25.677971146, 30.249972485),
        (114, 37.675988548, 20.123394661),
        (114, 23.102577378, 25.964258199),
        (114, 11.104559976, 36.090836024),
    ]]
    chamfer(chamfer3_edges, length=CHAMFER3_SIZE)

    # Sketch7 → Boss-Extrude3 (add)
    with BuildSketch(Plane(origin=(115, 0, 0), x_dir=(0, 0, -1), z_dir=(1, 0, 0)).offset(BOSS_EXTRUDE3_START)):
        with Locations((-2, 50)):
            Rectangle(SKETCH7_W, SKETCH7_H)
        with Locations((-2, 10)):
            Rectangle(SKETCH7_W, SKETCH7_H)
    boss_extrude3 = extrude(amount=BOSS_EXTRUDE3_DEPTH)

    # Sketch8 → Cut-Extrude5 (cut)
    with BuildSketch(Plane.XY.offset(4)):
        with Locations((123, 50)):
            Circle(SKETCH8_R)
        with Locations((123, 10)):
            Circle(SKETCH8_R)
    cut_extrude5 = extrude(amount=-CUT_EXTRUDE5_DEPTH, mode=Mode.SUBTRACT)

    # Sketch9 → Cut-Extrude6 (cut)
    with BuildSketch(Plane.XY.offset(4)):
        with Locations((123, 50)):
            Circle(SKETCH9_R)
        with Locations((123, 10)):
            Circle(SKETCH9_R)
    cut_extrude6 = extrude(amount=-CUT_EXTRUDE6_DEPTH, mode=Mode.SUBTRACT)

    # Chamfer4
    chamfer4_edges = [part.edges().sort_by_distance(p)[0] for p in [
        (119.35, 50, 4),
        (119.35, 10, 4),
    ]]
    chamfer(chamfer4_edges, length=CHAMFER4_SIZE)

    # Fillet2
    fillet2_edges = [part.edges().sort_by_distance(p)[0] for p in [
        (131, 58, 2),
        (131, 42, 2),
        (131, 18, 2),
        (131, 2, 2),
    ]]
    fillet(fillet2_edges, radius=FILLET2_R)

    # Mirror1: Boss-Extrude3, Cut-Extrude5, Cut-Extrude6 across plane
    add(boss_extrude3.mirror(Plane(origin=(57.5, 0, 0), x_dir=(0, 0, 1), z_dir=(1, 0, 0))))
    add(cut_extrude5.mirror(Plane(origin=(57.5, 0, 0), x_dir=(0, 0, 1), z_dir=(1, 0, 0))), mode=Mode.SUBTRACT)
    add(cut_extrude6.mirror(Plane(origin=(57.5, 0, 0), x_dir=(0, 0, 1), z_dir=(1, 0, 0))), mode=Mode.SUBTRACT)

    # Chamfer4 of Mirror1
    chamfer4_of_mirror1_edges = [part.edges().sort_by_distance(p)[0] for p in [
        (-4.35, 50, 4),
        (-4.35, 10, 4),
    ]]
    chamfer(chamfer4_of_mirror1_edges, length=CHAMFER4_OF_MIRROR1_SIZE)

    # Fillet2 of Mirror1
    fillet2_of_mirror1_edges = [part.edges().sort_by_distance(p)[0] for p in [
        (-16, 58, 2),
        (-16, 42, 2),
        (-16, 18, 2),
        (-16, 2, 2),
    ]]
    fillet(fillet2_of_mirror1_edges, radius=FILLET2_OF_MIRROR1_R)

    # Chamfer5
    chamfer5_edges = [part.edges().sort_by_distance(p)[0] for p in [
        (121.5, 42, 4),
        (121.5, 58, 4),
        (121.5, 2, 4),
        (121.5, 18, 4),
        (131, 10, 4),
        (130.121320344, 2.878679656, 4),
        (130.121320344, 17.121320344, 4),
        (131, 50, 4),
        (130.121320344, 42.878679656, 4),
        (130.121320344, 57.121320344, 4),
        (-6.5, 58, 4),
        (-6.5, 42, 4),
        (-6.5, 18, 4),
        (-6.5, 2, 4),
        (-16, 10, 4),
        (-15.121320344, 2.878679656, 4),
        (-15.121320344, 17.121320344, 4),
        (-16, 50, 4),
        (-15.121320344, 42.878679656, 4),
        (-15.121320344, 57.121320344, 4),
    ]]
    chamfer(chamfer5_edges, length=CHAMFER5_SIZE)


solid = part.part
